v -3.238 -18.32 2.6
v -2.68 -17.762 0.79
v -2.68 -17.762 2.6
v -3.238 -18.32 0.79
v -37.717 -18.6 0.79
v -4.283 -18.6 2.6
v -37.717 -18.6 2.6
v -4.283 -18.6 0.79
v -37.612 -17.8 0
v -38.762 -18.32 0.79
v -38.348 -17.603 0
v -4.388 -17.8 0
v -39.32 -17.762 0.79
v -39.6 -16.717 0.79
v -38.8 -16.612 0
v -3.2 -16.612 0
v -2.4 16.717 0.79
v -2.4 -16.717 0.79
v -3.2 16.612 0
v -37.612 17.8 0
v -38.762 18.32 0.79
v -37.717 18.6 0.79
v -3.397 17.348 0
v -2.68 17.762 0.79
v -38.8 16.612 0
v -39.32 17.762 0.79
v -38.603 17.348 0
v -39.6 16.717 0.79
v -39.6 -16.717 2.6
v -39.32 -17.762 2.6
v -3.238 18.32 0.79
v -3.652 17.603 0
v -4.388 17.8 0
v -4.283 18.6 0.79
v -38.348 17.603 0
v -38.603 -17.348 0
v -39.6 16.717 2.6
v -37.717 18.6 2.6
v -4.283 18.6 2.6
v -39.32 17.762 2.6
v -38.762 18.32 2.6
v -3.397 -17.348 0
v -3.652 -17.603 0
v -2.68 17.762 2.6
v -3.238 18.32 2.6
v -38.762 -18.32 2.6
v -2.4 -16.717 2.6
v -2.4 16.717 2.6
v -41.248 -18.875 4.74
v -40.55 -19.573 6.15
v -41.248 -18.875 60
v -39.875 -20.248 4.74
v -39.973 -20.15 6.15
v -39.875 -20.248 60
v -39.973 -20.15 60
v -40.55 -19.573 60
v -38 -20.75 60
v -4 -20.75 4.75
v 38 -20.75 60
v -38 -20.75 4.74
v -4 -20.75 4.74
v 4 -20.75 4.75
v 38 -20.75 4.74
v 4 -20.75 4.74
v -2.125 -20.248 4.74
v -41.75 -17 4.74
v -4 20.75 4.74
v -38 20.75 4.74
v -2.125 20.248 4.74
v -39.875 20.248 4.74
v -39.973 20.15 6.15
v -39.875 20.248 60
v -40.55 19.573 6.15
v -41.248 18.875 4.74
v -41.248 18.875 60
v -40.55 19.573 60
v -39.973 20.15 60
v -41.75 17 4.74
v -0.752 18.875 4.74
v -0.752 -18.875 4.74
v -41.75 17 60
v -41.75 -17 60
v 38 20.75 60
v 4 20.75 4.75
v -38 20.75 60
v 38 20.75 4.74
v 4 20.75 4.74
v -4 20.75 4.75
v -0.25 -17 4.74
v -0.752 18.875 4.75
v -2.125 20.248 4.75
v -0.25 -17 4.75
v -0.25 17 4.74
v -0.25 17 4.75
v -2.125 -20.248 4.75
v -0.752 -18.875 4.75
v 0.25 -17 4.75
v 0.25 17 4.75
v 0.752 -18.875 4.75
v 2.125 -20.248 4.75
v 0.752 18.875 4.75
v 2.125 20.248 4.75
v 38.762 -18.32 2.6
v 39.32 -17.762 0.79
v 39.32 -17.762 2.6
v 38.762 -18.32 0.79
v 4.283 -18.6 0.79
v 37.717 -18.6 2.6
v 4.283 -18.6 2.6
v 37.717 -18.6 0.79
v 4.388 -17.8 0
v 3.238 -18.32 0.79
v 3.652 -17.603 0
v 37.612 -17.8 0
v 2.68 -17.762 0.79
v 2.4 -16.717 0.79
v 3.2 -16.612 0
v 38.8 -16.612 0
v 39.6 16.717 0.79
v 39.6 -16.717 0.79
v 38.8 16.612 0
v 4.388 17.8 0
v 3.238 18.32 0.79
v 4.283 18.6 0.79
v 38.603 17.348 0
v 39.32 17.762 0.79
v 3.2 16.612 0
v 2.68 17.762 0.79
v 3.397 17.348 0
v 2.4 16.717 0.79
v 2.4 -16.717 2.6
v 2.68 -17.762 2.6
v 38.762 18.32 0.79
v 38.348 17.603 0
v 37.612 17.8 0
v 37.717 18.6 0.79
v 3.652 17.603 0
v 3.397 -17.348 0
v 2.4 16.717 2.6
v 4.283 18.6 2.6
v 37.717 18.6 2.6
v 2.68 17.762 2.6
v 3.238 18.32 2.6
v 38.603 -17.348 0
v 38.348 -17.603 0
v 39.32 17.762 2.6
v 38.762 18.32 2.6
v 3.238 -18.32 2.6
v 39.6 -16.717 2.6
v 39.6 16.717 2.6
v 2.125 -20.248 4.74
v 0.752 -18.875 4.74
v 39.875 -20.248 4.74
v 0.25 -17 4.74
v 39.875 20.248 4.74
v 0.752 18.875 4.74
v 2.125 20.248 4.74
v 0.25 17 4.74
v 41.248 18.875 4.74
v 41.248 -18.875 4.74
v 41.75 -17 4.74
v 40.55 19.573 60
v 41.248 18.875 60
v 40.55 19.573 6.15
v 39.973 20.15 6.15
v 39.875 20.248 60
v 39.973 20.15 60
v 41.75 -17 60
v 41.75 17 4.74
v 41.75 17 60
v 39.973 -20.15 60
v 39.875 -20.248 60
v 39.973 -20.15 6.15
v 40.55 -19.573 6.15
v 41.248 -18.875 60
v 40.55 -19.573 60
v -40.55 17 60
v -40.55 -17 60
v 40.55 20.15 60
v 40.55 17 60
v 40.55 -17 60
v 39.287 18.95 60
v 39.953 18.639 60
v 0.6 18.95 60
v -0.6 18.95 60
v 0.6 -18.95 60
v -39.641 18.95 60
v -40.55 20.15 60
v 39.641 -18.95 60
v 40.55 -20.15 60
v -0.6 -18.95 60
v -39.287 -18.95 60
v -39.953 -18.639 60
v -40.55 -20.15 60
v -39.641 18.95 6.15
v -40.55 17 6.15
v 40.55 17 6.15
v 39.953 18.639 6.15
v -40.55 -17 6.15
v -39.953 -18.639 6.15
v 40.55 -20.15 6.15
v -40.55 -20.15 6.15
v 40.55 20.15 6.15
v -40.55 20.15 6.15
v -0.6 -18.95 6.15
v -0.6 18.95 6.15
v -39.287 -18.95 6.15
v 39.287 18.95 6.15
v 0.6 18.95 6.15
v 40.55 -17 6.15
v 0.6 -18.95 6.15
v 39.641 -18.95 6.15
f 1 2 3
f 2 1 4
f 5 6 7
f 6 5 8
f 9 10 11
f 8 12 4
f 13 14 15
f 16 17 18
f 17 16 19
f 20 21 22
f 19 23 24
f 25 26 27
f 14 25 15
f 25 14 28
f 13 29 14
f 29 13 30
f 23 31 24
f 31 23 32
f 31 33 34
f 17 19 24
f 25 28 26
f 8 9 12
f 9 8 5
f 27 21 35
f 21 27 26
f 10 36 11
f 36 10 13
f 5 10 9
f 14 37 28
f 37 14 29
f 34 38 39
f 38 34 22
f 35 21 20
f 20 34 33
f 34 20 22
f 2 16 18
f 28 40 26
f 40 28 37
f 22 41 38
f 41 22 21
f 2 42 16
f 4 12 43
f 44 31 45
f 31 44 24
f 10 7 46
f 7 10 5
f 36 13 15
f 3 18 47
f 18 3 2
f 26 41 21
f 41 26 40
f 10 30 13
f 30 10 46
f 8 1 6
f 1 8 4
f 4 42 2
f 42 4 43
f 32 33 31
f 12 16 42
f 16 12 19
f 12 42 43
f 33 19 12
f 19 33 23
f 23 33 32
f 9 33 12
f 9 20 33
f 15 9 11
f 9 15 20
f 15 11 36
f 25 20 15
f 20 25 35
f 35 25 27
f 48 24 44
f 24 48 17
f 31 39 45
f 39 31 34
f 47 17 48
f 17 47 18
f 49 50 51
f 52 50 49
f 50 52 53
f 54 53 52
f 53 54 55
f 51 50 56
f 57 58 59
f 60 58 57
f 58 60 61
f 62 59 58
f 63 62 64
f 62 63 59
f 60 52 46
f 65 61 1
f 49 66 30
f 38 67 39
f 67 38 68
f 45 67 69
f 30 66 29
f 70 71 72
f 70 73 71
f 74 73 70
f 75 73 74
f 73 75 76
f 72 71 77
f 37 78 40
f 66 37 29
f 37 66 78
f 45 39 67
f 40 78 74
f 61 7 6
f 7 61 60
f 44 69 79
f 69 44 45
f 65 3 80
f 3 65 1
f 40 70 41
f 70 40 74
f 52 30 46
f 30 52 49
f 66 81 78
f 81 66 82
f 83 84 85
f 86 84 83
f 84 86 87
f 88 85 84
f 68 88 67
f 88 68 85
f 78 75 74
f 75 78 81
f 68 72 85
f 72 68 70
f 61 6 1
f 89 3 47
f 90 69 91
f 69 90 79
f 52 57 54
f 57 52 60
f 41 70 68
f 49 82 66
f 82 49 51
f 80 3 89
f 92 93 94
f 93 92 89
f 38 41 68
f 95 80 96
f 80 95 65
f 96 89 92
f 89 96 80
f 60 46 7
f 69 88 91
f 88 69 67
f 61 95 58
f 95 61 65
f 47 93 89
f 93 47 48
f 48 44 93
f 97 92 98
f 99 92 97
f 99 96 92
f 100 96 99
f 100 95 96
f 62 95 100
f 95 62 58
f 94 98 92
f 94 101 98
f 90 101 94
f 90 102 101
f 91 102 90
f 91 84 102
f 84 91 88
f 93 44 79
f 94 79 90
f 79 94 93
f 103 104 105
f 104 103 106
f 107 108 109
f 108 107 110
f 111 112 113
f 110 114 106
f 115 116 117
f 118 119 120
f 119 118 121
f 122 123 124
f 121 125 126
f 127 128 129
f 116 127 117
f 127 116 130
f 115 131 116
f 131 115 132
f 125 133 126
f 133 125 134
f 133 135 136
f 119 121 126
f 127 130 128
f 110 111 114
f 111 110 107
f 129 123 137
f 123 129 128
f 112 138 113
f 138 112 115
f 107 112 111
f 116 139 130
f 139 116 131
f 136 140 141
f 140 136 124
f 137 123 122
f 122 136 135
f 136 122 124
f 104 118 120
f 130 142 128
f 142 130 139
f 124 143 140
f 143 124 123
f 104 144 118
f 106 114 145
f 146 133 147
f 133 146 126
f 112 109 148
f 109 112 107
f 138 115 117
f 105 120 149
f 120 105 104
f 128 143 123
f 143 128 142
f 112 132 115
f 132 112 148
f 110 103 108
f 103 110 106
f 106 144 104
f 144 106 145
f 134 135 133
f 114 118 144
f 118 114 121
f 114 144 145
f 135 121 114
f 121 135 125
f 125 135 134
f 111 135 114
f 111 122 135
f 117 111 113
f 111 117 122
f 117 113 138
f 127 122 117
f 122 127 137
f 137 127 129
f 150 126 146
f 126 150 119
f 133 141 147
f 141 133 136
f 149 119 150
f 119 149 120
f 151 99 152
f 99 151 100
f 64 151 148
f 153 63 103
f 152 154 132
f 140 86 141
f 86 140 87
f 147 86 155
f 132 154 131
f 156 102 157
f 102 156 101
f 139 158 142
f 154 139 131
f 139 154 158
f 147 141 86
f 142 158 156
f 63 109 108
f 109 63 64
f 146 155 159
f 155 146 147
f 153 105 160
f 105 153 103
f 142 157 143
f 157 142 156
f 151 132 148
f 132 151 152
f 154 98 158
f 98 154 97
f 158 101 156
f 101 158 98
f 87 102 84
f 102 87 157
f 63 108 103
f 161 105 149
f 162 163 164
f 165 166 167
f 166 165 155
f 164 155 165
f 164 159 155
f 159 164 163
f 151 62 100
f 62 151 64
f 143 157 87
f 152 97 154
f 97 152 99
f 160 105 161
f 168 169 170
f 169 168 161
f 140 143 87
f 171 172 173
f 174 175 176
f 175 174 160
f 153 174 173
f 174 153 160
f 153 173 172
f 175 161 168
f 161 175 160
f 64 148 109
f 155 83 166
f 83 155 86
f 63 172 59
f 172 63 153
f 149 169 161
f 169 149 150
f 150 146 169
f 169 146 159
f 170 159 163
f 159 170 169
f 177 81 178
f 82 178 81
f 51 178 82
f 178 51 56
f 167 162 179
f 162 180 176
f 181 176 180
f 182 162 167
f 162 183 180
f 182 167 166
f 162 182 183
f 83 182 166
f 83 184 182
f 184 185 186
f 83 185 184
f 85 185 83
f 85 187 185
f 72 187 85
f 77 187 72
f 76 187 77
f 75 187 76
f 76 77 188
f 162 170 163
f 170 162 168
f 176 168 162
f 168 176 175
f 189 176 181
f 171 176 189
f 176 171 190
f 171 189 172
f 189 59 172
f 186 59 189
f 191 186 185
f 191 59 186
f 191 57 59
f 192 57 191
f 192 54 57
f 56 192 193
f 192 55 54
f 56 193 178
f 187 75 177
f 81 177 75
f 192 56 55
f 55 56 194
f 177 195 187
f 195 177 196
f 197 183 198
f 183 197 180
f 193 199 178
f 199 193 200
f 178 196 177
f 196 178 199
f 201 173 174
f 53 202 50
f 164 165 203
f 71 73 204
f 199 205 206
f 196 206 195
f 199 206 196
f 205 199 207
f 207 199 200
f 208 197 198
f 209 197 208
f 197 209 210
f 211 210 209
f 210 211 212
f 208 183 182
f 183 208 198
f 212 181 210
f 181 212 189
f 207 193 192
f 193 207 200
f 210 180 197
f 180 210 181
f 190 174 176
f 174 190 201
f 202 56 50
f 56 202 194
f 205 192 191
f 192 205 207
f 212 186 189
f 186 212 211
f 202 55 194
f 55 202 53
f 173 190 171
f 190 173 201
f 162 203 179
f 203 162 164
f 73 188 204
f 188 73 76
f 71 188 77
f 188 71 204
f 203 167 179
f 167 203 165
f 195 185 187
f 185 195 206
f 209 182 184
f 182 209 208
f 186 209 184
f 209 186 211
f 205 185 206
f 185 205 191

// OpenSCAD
// file: ../lib/vessel.scad
// SPDX-License-Identifier: MIT
// Copyright (c) 2026 Aaron Cupp
//
// vessel.scad — parametric collar cups for bottles, cans, and pen-form tools.
//
// A collar cup is a solid Gridfinity block with cylindrical bores sunk into it.
// It LOCATES a vessel; it does not clamp one. That distinction is the whole
// design: a collar that grips harder than the bin weighs comes out of the
// baseplate with the bottle when you grab it one-handed. Clearance, not
// interference — CLR is per-diameter, not per-side.
//
// Capture depth is roughly a third of the vessel's height. Enough to resist a
// knock (this bench sits under a 180 W fume-extractor intake), not so much that
// you're fishing the bottle out.
//
//   collar_cup(nx, ny, vessel_d, capture_h, …)   — one centred bore
//   collar_cup_multi(nx, ny, bores, capture_h, …) — bores = [[x, y, d], …]
//
// Cord slot: pen-form tools that stand in a cup are usually corded (the HARDELL
// rotary tool takes a barrel jack). Without a slot the lead drapes over the rim
// and levers the tool sideways. `cord_w > 0` cuts a channel from the bore out
// through the wall, open to the top.

include <gridfinity.scad>

CLR      = 1.0;   // bore = vessel_d + CLR. Loose on purpose — see above.
MIN_WALL = 1.2;   // minimum material between two bores, and bore to outer face

// ---- geometry guards ----
// Overlapping bores and bores that break out through the side wall both still
// render as perfectly watertight, 2-manifold meshes — CI cannot tell you the
// part is wrong, only that it is closed. These asserts encode the intent that
// the mesh check can't. Cheap, and they fire at render time rather than on the
// printer.
function _pair_gaps(bores, clr) = [
    for (i = [0 : len(bores)-1], j = [0 : len(bores)-1]) if (i < j)
        norm([bores[i][0]-bores[j][0], bores[i][1]-bores[j][1]])
        - (bores[i][2]+clr)/2 - (bores[j][2]+clr)/2
];
function _edge_gaps(bores, clr, W, D) = [
    for (b = bores) min(W/2 - abs(b[0]) - (b[2]+clr)/2,
                        D/2 - abs(b[1]) - (b[2]+clr)/2)
];

// Multi-bore block. Bores are [x, y, diameter] in mm, relative to the block centre.
module collar_cup_multi(nx, ny, bores, capture_h, floor = 1.4, clr = CLR,
                        cord_w = 0, cord_at = 0, min_wall = MIN_WALL) {
    h = BIN_BASE_H + floor + capture_h;
    e = 0.1;
    W = nx*GF - 0.5; D = ny*GF - 0.5;
    _pg = _pair_gaps(bores, clr);
    _eg = _edge_gaps(bores, clr, W, D);
    assert(len(_pg) == 0 || min(_pg) >= min_wall,
           "collar_cup: bores are too close — they would merge into one pocket");
    assert(min(_eg) >= min_wall,
           "collar_cup: a bore breaches the outer wall — block needs more units");
    difference() {
        bin_blank(nx, ny, h);
        for (b = bores)
            translate([b[0], b[1], BIN_BASE_H + floor])
                cylinder(d = b[2] + clr, h = capture_h + e, $fn = 96);
        // Cord channel: from the first bore outward through the +X wall, open to
        // the rim so the lead drops in from above rather than threading.
        if (cord_w > 0)
            translate([bores[0][0], bores[0][1] - cord_w/2, BIN_BASE_H + floor + cord_at])
                cube([nx*GF, cord_w, h]);
    }
}

// Single centred bore — the common case.
module collar_cup(nx, ny, vessel_d, capture_h, floor = 1.4, clr = CLR,
                  cord_w = 0, cord_at = 0, min_wall = MIN_WALL) {
    collar_cup_multi(nx, ny, [[0, 0, vessel_d]], capture_h, floor, clr,
                     cord_w, cord_at, min_wall);
}

// Evenly spaced row of same-depth bores along X — for a rank of aerosol cans.
// Returns geometry, not a list; pass the diameters and it lays them out on the
// block's centre line.
module collar_cup_row(nx, ny, diameters, capture_h, floor = 1.4, clr = CLR,
                      min_wall = MIN_WALL) {
    n = len(diameters);
    pitch = nx * GF / n;
    collar_cup_multi(nx, ny,
        [for (i = [0 : n-1]) [(i - (n-1)/2) * pitch, 0, diameters[i]]],
        capture_h, floor, clr, 0, 0, min_wall);
}
// file: cleaning_station_common.scad
// cleaning_station_common.scad — shared parameters for the bench cleaning station.
//
// The IPA / contact-cleaner corner of the electronics repair bench. Everything
// here is measured off the actual items with calipers; nothing is a nominal from
// a product page. Diameters carry a per-diameter clearance (lib/vessel.scad CLR),
// not per-side.
//
// This corner sits under a fume-extractor intake, which drives two decisions:
//   * Cups CAPTURE the vessel rather than clamp it — a collar that grips harder
//     than the bin weighs lifts out of the baseplate with the bottle.
//   * Bins stay as low as the job allows. Capture velocity is decided in the
//     first six inches, and a wall of tall bins in front of the hood costs it.
//
// The aerosols are FLAMMABLE and this bench has a 400 °C iron on it. These cups
// are for working cans only; bulk stock belongs away from the hood entirely.
//
// SPDX-License-Identifier: CC-BY-NC-SA-4.0
// Copyright (c) 2026 Aaron Cupp

include <../lib/vessel.scad>

// ---- measured diameters (mm) ----
// DeoxIT bore: taken from the PART, not from a can measurement.
//
// The 2026-08-20 print had three bores — 57.00 / 55.20 / 52.75. The 57.00 fits a
// DeoxIT; 55.20 barely does; 52.75 holds nothing. So 57.00 is a validated bore,
// which beats re-deriving it from a can diameter plus a clearance guess. D5, F5
// and G5 are the same can, so one bore serves all three.
BORE_DEOXIT = 57.00;   // ✅ proven by the printed part

// Freeze spray is a DIFFERENT, LARGER can — 13 mm wider than a DeoxIT, which is
// why it never fitted a shared block.
D_FREEZE_SPRAY = 69.00;   // ✅ measured 2026-08-20 (was 56.00, badly wrong)
FREEZE_CLR     = 2.0;     // [1:0.5:4] -> 71.00 bore
FREEZE_MEASURED = true;

D_DISPENSER    = 53.50;   // 200 ml push-down alcohol pump, square base across flats
D_FLOOD_BOTTLE = 75.50;

// DeoxIT D100 / F100 / G100 concentrate droppers — bare bottles, out of their
// kit boxes. The boxes are a full 2×1 EACH; the three bare bottles share one.
// NOT ROUND — 39 × 20 is a flattened cross-section, not a diameter and a height.
D_DROPPER_L = 39.00;   // measured 2026-08-20, long axis of the footprint
D_DROPPER_W = 20.00;   // measured, short axis
DROPPER_CLR = 1.00;    // per dimension, matching the CLR convention
CAP_DROPPER = 26;      // [8:1:40] capture depth. ⚠️ bottle HEIGHT is unmeasured —
                       //   39 turned out to be a footprint, so the height nobody
                       //   has taken.
                       //   RAISED 15 → 26 on 2026-08-24: at 15 the brushes and
                       //   swabs fell over in their slots. Depth is what resists
                       //   an applicator tipping, and 15 mm of it on a ~100 mm
                       //   brush is almost none. 26 makes the whole block half
                       //   again as tall, which is what was asked for.
                       //   Read the bin_deoxit_droppers header before assuming
                       //   this alone fixes the tipping — it does not.

// ---- melamine sponges (mm) — 3.94 × 2.35 × 0.79 in ----
// Full block as sold. Bulk stock lives in the bag under the desk, ~100 of them;
// none of it competes for grid.
SPONGE_L = 100.1; SPONGE_W = 59.7; SPONGE_T = 20.1;

// WORKING size: a full block is far more sponge than any bench task needs, and
// melamine is consumed by abrasion — quartering one gets four uses out of what
// was one, and the smaller piece reaches between connectors where a 100 mm block
// cannot. Halve across, halve lengthwise.
CUT_L = SPONGE_L / 2;   // 50.05
CUT_W = SPONGE_W / 2;   // 29.85
CUT_T = SPONGE_T;       // 20.1 — unchanged, cuts are through the face

// ---- capture depth ----
// Vessel HEIGHTS were not measured, so this is a judgement call rather than a
// derived third-of-height: 50 mm resists a knock without making the bottles a
// two-handed retrieval. One number to change if the first print feels wrong.
CAPTURE = 50;

// Sponge bin: sponges stand ON EDGE (60 mm tall), ~4 across the 81 mm interior.
// On edge beats flat-stacked — same count in a 68 mm bin instead of a 107 mm one,
// and any sponge can be pinched out rather than peeling off the top of a pile.
// Height is set by a FULL block standing on edge, not a cut one — so one uncut
// block can still ride in the bin as reserve alongside the trimmed pieces.
// Cut pieces are 50 long, which is what lets the footprint drop to 2×2.
SPONGE_BIN_H = SPONGE_W + BIN_BASE_H + 1.4 + 2;   // ≈ 68
// main file
// bin_brushes — 2×1 bin, split down the middle, for cleaning brushes and
// toothbrushes. Two lanes so the dirty ones stay away from the clean ones.
//
// Brushes stand upright: a toothbrush is ~180 mm and would not lie in an 83 mm
// bin. BRUSH_H captures roughly a third of one, same rule as the rotary tool cup.
//
// PRINT: as emitted, feet down. No supports.
//
// SPDX-License-Identifier: CC-BY-NC-SA-4.0
// Copyright (c) 2026 Aaron Cupp
include <cleaning_station_common.scad>

BRUSH_H = 60;   // [30:1:120] bin height

divided_bin(2, 1, BRUSH_H, cols = 2, rows = 1);
